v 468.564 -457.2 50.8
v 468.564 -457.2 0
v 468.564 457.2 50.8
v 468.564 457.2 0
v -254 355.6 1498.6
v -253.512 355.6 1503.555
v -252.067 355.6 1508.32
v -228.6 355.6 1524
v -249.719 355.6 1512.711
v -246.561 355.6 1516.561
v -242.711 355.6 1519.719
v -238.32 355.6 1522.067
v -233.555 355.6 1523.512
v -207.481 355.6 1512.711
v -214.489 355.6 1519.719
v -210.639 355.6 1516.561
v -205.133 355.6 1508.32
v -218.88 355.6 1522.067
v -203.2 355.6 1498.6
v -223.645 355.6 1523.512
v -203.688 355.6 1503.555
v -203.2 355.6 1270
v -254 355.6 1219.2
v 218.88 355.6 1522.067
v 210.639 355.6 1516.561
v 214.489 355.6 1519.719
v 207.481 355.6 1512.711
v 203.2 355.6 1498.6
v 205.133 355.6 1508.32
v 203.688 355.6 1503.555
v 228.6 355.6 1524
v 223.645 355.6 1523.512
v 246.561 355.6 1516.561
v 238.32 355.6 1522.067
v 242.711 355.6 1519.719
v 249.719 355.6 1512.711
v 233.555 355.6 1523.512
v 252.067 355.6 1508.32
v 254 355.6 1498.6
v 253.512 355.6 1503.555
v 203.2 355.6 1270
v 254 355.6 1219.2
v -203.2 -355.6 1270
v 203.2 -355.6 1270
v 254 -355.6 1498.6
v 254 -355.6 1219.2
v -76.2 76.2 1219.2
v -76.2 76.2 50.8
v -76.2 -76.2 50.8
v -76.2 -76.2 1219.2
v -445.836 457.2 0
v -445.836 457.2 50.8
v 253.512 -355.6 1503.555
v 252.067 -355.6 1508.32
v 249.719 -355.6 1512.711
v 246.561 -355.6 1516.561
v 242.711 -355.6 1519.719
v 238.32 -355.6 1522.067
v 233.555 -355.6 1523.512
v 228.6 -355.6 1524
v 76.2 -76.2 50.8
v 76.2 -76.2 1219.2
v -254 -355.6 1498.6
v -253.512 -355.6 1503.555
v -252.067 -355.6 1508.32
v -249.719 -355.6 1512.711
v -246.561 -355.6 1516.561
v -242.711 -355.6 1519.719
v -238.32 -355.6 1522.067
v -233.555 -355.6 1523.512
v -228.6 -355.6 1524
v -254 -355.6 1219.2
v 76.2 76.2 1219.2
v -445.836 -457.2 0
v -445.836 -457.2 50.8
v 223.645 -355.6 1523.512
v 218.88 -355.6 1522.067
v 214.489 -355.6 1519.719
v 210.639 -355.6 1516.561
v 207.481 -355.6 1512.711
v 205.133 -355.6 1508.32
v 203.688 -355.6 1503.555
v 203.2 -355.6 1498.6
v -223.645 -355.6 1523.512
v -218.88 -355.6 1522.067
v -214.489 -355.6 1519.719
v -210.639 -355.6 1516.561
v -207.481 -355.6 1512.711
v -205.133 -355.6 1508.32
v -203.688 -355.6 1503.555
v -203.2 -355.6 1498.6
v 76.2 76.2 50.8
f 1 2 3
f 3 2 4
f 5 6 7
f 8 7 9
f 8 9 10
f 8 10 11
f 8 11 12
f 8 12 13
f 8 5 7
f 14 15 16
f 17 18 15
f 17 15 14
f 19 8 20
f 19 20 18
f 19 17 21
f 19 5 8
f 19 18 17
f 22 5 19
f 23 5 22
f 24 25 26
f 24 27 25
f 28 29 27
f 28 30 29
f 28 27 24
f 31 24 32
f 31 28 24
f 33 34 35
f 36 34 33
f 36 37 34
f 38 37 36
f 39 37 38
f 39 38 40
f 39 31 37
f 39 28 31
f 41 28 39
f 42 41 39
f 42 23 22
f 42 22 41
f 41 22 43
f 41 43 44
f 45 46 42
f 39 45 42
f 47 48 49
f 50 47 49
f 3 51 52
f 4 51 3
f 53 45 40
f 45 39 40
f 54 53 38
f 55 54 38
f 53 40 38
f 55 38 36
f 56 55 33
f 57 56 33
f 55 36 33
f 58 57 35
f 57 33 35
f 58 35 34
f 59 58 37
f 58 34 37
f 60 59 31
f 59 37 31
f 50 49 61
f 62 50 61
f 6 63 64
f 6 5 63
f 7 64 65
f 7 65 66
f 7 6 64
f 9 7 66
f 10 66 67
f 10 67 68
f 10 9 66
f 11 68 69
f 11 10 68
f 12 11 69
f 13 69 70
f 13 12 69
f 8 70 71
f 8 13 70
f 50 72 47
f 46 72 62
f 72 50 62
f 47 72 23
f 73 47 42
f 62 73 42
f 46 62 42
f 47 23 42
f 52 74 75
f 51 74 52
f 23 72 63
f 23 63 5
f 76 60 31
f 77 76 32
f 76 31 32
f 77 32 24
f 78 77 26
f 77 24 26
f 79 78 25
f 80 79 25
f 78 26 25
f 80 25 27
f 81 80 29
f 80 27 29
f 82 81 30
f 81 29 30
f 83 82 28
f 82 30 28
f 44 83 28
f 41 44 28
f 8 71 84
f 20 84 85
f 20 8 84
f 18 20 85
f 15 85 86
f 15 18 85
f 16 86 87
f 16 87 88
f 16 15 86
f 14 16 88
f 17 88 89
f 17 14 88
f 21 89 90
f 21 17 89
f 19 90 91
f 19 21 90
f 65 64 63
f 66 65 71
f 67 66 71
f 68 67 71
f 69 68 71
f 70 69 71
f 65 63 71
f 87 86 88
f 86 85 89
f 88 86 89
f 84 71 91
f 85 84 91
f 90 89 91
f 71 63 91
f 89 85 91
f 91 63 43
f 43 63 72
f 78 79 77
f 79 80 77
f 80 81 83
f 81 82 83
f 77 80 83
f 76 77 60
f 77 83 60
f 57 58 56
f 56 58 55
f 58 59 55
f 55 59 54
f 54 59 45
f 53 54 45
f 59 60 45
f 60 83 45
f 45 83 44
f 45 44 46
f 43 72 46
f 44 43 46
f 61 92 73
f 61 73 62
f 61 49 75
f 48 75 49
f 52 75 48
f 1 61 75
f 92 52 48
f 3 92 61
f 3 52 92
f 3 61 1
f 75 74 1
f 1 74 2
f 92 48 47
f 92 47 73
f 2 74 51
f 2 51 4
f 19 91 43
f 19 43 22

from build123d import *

# Parameters (mm, degrees)
F0_W     = 914.4
F0_H     = 914.4
F1_DEPTH = 50.8
F2_W     = 152.4
F2_H     = 152.4
F3_DEPTH = 1219.2
F4_W     = 508
F4_H     = 711.2
F5_DEPTH = 304.8
F6_W     = 406.4
F6_H     = 812.8
F7_DEPTH = 254
F8_R     = 25.39999


# Not quite as in the source:
# - a fillet or chamfer is up to 0.001 mm smaller than in the source, because OpenCascade refuses the exact size
# - a feature names something its author has since deleted; it is built from what else it names


with BuildPart() as f1:
    # F0 (on Top) → F1 (new body)
    with BuildSketch(Plane.XY):
        with Locations((11.3640455229, 0)):
            Rectangle(F0_W, F0_H)
    extrude(amount=F1_DEPTH)

    # F2 (on face) → F3 (join)
    with BuildSketch(Plane(origin=(0, 0, 0), x_dir=(1, 0, 0), z_dir=(0, 0, -1))):
        Rectangle(F2_W, F2_H)
    extrude(amount=-F3_DEPTH)

    # F4 (on face) → F5 (join)
    with BuildSketch(Plane.XY.offset(1219.2)):
        Rectangle(F4_W, F4_H)
    extrude(amount=F5_DEPTH)

    # F6 (on face) → F7 (cut)
    with BuildSketch(Plane.XY.offset(1524)):
        Rectangle(F6_W, F6_H)
    extrude(amount=-F7_DEPTH, mode=Mode.SUBTRACT)

    # F8 (radius 25.4 in the source; OpenCascade refuses exactly that, so slightly less here)
    f8_edges = [f1.edges().sort_by_distance(p)[0] for p in [
        (-254, 0, 1524),
        (-203.2, 0, 1524),
        (203.2, 0, 1524),
        (254, 0, 1524),
    ]]
    fillet(f8_edges, radius=F8_R)


solid = f1.part
